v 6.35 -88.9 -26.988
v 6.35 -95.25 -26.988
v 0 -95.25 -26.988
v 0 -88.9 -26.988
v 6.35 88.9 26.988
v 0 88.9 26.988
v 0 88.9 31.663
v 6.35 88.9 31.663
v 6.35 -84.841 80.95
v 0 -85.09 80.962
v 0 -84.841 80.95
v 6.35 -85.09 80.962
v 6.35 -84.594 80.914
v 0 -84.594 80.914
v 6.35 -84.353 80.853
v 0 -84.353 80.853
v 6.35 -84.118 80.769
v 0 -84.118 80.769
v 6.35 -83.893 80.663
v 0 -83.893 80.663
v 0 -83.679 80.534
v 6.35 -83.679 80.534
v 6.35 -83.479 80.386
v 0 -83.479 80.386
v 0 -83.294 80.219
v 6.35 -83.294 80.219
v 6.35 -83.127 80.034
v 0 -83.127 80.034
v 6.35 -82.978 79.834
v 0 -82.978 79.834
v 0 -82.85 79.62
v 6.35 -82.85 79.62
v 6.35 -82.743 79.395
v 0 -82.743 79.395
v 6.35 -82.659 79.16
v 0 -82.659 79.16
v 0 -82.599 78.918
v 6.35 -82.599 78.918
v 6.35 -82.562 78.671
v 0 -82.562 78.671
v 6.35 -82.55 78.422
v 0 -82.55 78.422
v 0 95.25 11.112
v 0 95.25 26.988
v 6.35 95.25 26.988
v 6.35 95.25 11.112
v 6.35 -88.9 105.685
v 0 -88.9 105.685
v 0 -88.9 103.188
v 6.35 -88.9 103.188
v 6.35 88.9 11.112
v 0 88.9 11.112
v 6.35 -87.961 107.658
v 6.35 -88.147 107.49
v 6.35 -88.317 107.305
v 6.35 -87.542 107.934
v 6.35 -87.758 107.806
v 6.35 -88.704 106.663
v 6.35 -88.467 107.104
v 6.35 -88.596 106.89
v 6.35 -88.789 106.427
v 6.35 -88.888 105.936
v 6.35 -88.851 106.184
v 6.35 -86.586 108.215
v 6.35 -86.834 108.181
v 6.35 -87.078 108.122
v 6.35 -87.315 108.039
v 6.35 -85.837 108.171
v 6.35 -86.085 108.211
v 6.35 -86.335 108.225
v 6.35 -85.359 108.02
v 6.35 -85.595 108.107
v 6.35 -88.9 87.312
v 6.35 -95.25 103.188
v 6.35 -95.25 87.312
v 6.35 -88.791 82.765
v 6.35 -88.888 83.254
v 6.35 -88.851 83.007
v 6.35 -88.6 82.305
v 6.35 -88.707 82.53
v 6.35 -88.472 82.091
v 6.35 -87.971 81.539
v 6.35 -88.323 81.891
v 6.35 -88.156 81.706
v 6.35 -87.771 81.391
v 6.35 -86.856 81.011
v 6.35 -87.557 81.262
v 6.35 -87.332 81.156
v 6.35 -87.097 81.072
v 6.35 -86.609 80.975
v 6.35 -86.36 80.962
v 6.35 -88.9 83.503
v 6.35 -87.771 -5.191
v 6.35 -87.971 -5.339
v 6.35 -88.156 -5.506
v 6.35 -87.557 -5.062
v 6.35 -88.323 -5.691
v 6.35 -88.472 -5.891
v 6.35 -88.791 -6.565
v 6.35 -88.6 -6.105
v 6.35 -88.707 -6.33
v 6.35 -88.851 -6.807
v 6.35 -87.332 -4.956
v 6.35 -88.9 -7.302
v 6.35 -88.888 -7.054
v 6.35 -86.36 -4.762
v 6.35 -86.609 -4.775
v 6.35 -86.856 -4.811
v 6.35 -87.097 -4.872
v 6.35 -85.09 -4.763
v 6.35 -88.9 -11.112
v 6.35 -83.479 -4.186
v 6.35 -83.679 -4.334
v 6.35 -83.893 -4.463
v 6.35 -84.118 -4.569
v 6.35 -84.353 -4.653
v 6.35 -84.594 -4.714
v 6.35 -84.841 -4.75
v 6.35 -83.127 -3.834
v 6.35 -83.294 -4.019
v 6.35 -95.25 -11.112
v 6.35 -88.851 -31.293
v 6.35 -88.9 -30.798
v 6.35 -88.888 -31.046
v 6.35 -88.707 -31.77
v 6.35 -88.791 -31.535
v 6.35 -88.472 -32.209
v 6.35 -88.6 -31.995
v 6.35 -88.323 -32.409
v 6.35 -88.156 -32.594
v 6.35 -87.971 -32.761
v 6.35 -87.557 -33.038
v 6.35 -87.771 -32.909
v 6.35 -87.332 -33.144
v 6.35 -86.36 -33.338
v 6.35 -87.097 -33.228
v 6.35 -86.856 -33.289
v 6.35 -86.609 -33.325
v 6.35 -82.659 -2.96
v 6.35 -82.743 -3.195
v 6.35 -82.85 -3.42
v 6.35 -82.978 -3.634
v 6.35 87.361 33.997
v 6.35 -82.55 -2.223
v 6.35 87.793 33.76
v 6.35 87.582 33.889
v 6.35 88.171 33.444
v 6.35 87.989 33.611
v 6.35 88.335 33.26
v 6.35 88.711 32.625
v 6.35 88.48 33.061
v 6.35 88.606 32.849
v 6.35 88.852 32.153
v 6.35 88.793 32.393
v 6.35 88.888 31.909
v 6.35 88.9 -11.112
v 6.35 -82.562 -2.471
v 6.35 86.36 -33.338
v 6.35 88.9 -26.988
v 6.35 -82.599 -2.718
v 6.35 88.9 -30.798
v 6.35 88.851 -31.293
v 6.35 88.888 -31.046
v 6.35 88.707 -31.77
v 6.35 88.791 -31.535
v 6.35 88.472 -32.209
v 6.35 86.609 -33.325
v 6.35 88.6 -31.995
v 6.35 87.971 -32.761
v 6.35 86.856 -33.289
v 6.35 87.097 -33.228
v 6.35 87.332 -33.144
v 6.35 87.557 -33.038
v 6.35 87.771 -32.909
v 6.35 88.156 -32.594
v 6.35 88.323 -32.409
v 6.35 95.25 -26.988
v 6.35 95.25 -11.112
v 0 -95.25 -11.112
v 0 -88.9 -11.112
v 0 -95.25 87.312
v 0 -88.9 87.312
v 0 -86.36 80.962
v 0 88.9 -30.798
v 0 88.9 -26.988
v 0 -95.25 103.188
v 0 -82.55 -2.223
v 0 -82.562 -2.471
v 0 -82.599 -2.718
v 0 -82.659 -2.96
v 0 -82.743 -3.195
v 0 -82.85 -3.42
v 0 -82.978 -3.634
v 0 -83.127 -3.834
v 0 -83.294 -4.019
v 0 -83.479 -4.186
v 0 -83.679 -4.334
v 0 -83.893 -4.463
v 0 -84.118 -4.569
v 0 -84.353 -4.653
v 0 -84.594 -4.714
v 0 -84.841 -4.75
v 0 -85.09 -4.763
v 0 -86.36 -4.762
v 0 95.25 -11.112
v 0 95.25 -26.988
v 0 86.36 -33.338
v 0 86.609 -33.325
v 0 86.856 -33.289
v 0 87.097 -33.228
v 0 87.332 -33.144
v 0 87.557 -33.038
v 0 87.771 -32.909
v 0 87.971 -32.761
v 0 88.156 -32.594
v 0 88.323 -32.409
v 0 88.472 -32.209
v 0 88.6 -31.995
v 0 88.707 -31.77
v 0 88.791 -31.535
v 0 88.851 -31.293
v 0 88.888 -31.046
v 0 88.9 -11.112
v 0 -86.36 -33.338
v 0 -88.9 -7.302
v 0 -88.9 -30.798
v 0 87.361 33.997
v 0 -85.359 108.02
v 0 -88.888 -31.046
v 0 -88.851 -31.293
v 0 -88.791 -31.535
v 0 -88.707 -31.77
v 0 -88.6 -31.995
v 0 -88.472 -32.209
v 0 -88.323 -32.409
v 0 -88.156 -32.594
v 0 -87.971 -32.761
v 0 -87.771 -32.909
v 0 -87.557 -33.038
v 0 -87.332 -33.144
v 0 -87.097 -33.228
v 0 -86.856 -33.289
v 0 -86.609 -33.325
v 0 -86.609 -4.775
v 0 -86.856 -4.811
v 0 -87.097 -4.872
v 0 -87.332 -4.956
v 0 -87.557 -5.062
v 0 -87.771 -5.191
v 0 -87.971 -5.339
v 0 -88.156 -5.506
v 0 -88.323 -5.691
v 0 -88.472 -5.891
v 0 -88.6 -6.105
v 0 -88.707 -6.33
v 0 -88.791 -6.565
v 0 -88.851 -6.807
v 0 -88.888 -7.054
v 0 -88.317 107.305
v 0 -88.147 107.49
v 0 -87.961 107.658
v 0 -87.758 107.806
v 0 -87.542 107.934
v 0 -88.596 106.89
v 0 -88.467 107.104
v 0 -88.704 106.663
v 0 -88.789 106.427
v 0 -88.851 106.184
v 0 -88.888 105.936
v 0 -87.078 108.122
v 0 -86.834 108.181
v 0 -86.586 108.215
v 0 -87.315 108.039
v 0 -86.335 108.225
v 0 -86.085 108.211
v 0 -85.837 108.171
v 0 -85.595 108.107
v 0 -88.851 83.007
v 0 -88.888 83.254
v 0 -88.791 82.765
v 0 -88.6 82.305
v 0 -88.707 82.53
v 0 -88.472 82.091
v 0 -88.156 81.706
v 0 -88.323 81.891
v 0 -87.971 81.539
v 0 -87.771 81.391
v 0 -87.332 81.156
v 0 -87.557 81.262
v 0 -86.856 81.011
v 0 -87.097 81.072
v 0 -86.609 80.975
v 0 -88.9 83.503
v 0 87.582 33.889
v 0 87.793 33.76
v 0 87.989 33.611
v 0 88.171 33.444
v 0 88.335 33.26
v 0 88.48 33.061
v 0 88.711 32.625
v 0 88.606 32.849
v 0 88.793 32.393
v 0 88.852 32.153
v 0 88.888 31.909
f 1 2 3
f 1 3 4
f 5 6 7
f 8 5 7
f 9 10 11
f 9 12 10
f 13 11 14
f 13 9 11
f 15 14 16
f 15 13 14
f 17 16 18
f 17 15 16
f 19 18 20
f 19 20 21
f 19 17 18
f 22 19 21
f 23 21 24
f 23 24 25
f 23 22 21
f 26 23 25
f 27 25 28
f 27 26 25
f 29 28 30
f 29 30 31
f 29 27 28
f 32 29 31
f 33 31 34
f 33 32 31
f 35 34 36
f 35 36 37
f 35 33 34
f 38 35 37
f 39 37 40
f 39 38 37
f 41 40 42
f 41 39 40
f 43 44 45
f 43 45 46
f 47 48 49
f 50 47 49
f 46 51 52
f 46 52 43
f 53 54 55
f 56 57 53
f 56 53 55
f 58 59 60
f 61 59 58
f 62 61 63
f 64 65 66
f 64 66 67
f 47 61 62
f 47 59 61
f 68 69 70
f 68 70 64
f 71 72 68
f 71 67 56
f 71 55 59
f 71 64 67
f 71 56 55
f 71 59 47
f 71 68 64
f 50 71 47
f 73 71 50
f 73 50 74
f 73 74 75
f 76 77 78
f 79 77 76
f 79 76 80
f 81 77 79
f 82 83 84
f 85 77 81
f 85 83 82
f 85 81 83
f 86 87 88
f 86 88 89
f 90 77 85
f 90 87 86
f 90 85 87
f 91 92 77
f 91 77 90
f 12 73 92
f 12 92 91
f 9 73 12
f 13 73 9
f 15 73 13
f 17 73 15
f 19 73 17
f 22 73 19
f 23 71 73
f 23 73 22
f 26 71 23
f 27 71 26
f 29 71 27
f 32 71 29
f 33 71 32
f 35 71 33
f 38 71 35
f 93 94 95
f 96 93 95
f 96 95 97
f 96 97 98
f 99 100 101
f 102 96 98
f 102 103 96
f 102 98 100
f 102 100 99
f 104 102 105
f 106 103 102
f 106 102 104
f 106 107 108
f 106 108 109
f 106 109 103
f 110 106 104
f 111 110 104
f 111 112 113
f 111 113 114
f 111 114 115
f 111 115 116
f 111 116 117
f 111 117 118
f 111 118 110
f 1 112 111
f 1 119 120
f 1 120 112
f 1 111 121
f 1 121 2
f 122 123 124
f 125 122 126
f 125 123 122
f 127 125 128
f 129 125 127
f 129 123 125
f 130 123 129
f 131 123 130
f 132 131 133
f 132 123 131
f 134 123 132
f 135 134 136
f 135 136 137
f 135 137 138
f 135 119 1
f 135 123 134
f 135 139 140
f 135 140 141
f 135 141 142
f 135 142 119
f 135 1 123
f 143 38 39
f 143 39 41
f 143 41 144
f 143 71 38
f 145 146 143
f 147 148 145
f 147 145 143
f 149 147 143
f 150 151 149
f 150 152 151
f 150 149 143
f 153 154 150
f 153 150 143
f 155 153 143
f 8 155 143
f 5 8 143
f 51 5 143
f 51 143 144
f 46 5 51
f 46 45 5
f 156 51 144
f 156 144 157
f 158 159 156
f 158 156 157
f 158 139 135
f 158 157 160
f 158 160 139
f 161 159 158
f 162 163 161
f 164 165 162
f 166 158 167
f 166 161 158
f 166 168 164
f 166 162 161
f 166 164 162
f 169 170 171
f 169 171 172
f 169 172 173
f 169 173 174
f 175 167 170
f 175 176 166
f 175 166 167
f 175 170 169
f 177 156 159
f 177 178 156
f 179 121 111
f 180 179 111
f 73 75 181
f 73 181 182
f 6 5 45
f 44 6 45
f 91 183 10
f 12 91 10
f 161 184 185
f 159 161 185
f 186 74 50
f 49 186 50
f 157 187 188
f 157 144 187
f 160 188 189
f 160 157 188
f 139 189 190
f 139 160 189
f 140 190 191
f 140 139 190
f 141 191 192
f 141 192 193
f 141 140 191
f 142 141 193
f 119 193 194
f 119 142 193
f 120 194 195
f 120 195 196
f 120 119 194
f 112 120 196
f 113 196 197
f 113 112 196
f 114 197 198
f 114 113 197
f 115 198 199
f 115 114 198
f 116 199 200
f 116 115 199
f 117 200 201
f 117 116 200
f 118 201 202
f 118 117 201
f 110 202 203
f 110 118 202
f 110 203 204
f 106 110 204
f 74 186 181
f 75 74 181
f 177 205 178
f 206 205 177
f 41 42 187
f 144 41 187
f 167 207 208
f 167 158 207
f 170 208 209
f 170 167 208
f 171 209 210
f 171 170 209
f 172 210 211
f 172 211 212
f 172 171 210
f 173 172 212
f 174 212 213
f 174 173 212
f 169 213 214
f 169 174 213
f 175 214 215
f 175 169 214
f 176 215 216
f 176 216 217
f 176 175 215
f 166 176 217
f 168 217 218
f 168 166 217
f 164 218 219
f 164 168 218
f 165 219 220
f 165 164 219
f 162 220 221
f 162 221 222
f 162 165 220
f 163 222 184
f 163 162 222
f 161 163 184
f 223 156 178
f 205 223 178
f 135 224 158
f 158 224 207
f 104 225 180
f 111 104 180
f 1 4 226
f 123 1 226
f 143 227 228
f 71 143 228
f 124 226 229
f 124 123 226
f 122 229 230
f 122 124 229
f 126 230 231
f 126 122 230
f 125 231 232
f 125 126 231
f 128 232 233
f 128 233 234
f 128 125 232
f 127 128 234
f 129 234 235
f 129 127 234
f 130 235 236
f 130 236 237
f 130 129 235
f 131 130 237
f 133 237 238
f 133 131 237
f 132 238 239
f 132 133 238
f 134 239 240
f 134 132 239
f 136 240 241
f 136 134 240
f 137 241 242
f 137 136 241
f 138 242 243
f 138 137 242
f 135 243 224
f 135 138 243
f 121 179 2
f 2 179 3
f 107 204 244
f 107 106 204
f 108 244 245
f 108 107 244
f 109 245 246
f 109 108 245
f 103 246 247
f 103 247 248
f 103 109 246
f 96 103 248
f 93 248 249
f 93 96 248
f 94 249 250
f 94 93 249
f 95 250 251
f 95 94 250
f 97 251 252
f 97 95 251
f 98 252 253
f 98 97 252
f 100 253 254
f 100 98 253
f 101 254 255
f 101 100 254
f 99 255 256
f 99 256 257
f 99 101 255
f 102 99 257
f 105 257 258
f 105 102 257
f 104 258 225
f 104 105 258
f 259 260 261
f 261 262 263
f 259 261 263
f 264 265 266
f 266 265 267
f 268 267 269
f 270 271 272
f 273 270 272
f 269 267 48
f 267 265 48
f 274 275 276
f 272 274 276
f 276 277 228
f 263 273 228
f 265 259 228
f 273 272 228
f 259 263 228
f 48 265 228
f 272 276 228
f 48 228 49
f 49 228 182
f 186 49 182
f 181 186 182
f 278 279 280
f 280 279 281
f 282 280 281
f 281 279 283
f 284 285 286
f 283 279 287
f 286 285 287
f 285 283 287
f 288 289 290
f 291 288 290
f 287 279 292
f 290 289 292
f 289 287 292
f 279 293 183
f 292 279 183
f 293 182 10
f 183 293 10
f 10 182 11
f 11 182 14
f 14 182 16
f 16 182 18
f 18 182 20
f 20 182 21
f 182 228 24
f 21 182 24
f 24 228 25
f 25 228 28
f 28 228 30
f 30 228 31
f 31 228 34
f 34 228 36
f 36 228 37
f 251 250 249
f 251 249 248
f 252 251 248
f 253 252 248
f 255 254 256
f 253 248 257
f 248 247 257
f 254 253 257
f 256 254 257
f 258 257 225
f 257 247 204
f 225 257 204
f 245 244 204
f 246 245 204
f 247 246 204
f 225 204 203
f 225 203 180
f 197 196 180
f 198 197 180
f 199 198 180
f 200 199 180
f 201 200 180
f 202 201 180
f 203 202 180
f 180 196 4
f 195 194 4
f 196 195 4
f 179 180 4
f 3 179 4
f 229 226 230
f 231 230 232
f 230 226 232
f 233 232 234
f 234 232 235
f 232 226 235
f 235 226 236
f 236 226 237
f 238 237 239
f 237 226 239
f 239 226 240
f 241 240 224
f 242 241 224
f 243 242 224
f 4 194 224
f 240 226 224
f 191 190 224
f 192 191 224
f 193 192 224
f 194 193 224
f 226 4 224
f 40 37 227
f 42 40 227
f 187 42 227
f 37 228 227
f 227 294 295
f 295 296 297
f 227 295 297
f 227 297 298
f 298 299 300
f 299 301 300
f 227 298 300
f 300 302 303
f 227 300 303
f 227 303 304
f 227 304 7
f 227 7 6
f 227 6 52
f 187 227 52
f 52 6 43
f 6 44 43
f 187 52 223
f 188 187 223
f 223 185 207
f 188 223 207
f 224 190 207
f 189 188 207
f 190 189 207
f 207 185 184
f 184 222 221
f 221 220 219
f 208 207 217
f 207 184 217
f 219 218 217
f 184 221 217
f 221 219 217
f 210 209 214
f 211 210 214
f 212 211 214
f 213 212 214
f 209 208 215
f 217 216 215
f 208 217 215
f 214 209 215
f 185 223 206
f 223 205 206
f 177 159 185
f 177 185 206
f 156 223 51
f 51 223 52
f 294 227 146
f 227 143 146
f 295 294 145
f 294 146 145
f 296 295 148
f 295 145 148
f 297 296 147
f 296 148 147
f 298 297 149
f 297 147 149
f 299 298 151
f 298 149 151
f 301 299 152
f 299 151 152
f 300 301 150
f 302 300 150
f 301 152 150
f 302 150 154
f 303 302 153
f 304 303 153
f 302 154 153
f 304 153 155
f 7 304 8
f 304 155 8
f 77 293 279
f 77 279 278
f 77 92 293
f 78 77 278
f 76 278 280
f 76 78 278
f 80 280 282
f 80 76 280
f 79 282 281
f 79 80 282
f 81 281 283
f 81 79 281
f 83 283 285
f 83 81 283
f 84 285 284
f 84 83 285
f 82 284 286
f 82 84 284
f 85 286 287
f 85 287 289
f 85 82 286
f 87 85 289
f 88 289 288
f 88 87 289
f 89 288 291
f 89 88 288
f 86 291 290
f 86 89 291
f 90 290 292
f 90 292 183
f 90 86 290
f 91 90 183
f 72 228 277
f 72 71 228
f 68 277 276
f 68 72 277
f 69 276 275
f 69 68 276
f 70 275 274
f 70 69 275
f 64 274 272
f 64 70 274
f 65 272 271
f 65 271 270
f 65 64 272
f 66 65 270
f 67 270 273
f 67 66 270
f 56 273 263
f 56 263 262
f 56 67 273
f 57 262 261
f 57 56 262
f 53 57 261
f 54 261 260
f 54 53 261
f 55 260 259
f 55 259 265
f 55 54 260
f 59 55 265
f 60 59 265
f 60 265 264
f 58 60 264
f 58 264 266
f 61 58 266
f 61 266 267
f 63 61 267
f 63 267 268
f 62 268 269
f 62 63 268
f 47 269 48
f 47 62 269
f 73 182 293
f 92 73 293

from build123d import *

# Parameters (mm, degrees)
SKETCH1_W           = 15.875
SKETCH1_H           = 6.35
BOSS_EXTRUDE1_DEPTH = 6.35
FILLET1_R           = 2.54


with BuildPart() as part:
    # Sketch1 → Boss-Extrude1 (new body)
    with BuildSketch(Plane(origin=(0, 0, 0), x_dir=(0, 0, -1), z_dir=(1, 0, 0))):
        Polygon((-26.9875, 88.9), (-33.3375, 88.9), (-109.5375, -88.9), (-103.1875, -88.9), (-87.3125, -88.9), (-80.9625, -88.9), (-80.9625, -82.55), (4.7625, -82.55), (4.7625, -88.9), (11.1125, -88.9), (26.9875, -88.9), (33.3375, -88.9), (33.3375, 88.9), (26.9875, 88.9), (11.1125, 88.9), (-11.1125, 88.9), align=None)
        with Locations((19.05, -92.075)):
            Rectangle(SKETCH1_W, SKETCH1_H)
        with Locations((-19.05, 92.075)):
            Rectangle(SKETCH1_W, SKETCH1_H)
        with Locations((19.05, 92.075)):
            Rectangle(SKETCH1_W, SKETCH1_H)
        with Locations((-95.25, -92.075)):
            Rectangle(SKETCH1_W, SKETCH1_H)
    extrude(amount=BOSS_EXTRUDE1_DEPTH)

    # Fillet1
    fillet1_edges = [part.edges().sort_by_distance(p)[0] for p in [
        (3.175, -82.55, 80.9625),
        (3.175, -88.9, 80.9625),
        (3.175, -88.9, 109.5375),
        (3.175, 88.9, 33.3375),
        (3.175, 88.9, -33.3375),
        (3.175, -88.9, -33.3375),
        (3.175, -88.9, -4.7625),
        (3.175, -82.55, -4.7625),
    ]]
    fillet(fillet1_edges, radius=FILLET1_R)


solid = part.part
